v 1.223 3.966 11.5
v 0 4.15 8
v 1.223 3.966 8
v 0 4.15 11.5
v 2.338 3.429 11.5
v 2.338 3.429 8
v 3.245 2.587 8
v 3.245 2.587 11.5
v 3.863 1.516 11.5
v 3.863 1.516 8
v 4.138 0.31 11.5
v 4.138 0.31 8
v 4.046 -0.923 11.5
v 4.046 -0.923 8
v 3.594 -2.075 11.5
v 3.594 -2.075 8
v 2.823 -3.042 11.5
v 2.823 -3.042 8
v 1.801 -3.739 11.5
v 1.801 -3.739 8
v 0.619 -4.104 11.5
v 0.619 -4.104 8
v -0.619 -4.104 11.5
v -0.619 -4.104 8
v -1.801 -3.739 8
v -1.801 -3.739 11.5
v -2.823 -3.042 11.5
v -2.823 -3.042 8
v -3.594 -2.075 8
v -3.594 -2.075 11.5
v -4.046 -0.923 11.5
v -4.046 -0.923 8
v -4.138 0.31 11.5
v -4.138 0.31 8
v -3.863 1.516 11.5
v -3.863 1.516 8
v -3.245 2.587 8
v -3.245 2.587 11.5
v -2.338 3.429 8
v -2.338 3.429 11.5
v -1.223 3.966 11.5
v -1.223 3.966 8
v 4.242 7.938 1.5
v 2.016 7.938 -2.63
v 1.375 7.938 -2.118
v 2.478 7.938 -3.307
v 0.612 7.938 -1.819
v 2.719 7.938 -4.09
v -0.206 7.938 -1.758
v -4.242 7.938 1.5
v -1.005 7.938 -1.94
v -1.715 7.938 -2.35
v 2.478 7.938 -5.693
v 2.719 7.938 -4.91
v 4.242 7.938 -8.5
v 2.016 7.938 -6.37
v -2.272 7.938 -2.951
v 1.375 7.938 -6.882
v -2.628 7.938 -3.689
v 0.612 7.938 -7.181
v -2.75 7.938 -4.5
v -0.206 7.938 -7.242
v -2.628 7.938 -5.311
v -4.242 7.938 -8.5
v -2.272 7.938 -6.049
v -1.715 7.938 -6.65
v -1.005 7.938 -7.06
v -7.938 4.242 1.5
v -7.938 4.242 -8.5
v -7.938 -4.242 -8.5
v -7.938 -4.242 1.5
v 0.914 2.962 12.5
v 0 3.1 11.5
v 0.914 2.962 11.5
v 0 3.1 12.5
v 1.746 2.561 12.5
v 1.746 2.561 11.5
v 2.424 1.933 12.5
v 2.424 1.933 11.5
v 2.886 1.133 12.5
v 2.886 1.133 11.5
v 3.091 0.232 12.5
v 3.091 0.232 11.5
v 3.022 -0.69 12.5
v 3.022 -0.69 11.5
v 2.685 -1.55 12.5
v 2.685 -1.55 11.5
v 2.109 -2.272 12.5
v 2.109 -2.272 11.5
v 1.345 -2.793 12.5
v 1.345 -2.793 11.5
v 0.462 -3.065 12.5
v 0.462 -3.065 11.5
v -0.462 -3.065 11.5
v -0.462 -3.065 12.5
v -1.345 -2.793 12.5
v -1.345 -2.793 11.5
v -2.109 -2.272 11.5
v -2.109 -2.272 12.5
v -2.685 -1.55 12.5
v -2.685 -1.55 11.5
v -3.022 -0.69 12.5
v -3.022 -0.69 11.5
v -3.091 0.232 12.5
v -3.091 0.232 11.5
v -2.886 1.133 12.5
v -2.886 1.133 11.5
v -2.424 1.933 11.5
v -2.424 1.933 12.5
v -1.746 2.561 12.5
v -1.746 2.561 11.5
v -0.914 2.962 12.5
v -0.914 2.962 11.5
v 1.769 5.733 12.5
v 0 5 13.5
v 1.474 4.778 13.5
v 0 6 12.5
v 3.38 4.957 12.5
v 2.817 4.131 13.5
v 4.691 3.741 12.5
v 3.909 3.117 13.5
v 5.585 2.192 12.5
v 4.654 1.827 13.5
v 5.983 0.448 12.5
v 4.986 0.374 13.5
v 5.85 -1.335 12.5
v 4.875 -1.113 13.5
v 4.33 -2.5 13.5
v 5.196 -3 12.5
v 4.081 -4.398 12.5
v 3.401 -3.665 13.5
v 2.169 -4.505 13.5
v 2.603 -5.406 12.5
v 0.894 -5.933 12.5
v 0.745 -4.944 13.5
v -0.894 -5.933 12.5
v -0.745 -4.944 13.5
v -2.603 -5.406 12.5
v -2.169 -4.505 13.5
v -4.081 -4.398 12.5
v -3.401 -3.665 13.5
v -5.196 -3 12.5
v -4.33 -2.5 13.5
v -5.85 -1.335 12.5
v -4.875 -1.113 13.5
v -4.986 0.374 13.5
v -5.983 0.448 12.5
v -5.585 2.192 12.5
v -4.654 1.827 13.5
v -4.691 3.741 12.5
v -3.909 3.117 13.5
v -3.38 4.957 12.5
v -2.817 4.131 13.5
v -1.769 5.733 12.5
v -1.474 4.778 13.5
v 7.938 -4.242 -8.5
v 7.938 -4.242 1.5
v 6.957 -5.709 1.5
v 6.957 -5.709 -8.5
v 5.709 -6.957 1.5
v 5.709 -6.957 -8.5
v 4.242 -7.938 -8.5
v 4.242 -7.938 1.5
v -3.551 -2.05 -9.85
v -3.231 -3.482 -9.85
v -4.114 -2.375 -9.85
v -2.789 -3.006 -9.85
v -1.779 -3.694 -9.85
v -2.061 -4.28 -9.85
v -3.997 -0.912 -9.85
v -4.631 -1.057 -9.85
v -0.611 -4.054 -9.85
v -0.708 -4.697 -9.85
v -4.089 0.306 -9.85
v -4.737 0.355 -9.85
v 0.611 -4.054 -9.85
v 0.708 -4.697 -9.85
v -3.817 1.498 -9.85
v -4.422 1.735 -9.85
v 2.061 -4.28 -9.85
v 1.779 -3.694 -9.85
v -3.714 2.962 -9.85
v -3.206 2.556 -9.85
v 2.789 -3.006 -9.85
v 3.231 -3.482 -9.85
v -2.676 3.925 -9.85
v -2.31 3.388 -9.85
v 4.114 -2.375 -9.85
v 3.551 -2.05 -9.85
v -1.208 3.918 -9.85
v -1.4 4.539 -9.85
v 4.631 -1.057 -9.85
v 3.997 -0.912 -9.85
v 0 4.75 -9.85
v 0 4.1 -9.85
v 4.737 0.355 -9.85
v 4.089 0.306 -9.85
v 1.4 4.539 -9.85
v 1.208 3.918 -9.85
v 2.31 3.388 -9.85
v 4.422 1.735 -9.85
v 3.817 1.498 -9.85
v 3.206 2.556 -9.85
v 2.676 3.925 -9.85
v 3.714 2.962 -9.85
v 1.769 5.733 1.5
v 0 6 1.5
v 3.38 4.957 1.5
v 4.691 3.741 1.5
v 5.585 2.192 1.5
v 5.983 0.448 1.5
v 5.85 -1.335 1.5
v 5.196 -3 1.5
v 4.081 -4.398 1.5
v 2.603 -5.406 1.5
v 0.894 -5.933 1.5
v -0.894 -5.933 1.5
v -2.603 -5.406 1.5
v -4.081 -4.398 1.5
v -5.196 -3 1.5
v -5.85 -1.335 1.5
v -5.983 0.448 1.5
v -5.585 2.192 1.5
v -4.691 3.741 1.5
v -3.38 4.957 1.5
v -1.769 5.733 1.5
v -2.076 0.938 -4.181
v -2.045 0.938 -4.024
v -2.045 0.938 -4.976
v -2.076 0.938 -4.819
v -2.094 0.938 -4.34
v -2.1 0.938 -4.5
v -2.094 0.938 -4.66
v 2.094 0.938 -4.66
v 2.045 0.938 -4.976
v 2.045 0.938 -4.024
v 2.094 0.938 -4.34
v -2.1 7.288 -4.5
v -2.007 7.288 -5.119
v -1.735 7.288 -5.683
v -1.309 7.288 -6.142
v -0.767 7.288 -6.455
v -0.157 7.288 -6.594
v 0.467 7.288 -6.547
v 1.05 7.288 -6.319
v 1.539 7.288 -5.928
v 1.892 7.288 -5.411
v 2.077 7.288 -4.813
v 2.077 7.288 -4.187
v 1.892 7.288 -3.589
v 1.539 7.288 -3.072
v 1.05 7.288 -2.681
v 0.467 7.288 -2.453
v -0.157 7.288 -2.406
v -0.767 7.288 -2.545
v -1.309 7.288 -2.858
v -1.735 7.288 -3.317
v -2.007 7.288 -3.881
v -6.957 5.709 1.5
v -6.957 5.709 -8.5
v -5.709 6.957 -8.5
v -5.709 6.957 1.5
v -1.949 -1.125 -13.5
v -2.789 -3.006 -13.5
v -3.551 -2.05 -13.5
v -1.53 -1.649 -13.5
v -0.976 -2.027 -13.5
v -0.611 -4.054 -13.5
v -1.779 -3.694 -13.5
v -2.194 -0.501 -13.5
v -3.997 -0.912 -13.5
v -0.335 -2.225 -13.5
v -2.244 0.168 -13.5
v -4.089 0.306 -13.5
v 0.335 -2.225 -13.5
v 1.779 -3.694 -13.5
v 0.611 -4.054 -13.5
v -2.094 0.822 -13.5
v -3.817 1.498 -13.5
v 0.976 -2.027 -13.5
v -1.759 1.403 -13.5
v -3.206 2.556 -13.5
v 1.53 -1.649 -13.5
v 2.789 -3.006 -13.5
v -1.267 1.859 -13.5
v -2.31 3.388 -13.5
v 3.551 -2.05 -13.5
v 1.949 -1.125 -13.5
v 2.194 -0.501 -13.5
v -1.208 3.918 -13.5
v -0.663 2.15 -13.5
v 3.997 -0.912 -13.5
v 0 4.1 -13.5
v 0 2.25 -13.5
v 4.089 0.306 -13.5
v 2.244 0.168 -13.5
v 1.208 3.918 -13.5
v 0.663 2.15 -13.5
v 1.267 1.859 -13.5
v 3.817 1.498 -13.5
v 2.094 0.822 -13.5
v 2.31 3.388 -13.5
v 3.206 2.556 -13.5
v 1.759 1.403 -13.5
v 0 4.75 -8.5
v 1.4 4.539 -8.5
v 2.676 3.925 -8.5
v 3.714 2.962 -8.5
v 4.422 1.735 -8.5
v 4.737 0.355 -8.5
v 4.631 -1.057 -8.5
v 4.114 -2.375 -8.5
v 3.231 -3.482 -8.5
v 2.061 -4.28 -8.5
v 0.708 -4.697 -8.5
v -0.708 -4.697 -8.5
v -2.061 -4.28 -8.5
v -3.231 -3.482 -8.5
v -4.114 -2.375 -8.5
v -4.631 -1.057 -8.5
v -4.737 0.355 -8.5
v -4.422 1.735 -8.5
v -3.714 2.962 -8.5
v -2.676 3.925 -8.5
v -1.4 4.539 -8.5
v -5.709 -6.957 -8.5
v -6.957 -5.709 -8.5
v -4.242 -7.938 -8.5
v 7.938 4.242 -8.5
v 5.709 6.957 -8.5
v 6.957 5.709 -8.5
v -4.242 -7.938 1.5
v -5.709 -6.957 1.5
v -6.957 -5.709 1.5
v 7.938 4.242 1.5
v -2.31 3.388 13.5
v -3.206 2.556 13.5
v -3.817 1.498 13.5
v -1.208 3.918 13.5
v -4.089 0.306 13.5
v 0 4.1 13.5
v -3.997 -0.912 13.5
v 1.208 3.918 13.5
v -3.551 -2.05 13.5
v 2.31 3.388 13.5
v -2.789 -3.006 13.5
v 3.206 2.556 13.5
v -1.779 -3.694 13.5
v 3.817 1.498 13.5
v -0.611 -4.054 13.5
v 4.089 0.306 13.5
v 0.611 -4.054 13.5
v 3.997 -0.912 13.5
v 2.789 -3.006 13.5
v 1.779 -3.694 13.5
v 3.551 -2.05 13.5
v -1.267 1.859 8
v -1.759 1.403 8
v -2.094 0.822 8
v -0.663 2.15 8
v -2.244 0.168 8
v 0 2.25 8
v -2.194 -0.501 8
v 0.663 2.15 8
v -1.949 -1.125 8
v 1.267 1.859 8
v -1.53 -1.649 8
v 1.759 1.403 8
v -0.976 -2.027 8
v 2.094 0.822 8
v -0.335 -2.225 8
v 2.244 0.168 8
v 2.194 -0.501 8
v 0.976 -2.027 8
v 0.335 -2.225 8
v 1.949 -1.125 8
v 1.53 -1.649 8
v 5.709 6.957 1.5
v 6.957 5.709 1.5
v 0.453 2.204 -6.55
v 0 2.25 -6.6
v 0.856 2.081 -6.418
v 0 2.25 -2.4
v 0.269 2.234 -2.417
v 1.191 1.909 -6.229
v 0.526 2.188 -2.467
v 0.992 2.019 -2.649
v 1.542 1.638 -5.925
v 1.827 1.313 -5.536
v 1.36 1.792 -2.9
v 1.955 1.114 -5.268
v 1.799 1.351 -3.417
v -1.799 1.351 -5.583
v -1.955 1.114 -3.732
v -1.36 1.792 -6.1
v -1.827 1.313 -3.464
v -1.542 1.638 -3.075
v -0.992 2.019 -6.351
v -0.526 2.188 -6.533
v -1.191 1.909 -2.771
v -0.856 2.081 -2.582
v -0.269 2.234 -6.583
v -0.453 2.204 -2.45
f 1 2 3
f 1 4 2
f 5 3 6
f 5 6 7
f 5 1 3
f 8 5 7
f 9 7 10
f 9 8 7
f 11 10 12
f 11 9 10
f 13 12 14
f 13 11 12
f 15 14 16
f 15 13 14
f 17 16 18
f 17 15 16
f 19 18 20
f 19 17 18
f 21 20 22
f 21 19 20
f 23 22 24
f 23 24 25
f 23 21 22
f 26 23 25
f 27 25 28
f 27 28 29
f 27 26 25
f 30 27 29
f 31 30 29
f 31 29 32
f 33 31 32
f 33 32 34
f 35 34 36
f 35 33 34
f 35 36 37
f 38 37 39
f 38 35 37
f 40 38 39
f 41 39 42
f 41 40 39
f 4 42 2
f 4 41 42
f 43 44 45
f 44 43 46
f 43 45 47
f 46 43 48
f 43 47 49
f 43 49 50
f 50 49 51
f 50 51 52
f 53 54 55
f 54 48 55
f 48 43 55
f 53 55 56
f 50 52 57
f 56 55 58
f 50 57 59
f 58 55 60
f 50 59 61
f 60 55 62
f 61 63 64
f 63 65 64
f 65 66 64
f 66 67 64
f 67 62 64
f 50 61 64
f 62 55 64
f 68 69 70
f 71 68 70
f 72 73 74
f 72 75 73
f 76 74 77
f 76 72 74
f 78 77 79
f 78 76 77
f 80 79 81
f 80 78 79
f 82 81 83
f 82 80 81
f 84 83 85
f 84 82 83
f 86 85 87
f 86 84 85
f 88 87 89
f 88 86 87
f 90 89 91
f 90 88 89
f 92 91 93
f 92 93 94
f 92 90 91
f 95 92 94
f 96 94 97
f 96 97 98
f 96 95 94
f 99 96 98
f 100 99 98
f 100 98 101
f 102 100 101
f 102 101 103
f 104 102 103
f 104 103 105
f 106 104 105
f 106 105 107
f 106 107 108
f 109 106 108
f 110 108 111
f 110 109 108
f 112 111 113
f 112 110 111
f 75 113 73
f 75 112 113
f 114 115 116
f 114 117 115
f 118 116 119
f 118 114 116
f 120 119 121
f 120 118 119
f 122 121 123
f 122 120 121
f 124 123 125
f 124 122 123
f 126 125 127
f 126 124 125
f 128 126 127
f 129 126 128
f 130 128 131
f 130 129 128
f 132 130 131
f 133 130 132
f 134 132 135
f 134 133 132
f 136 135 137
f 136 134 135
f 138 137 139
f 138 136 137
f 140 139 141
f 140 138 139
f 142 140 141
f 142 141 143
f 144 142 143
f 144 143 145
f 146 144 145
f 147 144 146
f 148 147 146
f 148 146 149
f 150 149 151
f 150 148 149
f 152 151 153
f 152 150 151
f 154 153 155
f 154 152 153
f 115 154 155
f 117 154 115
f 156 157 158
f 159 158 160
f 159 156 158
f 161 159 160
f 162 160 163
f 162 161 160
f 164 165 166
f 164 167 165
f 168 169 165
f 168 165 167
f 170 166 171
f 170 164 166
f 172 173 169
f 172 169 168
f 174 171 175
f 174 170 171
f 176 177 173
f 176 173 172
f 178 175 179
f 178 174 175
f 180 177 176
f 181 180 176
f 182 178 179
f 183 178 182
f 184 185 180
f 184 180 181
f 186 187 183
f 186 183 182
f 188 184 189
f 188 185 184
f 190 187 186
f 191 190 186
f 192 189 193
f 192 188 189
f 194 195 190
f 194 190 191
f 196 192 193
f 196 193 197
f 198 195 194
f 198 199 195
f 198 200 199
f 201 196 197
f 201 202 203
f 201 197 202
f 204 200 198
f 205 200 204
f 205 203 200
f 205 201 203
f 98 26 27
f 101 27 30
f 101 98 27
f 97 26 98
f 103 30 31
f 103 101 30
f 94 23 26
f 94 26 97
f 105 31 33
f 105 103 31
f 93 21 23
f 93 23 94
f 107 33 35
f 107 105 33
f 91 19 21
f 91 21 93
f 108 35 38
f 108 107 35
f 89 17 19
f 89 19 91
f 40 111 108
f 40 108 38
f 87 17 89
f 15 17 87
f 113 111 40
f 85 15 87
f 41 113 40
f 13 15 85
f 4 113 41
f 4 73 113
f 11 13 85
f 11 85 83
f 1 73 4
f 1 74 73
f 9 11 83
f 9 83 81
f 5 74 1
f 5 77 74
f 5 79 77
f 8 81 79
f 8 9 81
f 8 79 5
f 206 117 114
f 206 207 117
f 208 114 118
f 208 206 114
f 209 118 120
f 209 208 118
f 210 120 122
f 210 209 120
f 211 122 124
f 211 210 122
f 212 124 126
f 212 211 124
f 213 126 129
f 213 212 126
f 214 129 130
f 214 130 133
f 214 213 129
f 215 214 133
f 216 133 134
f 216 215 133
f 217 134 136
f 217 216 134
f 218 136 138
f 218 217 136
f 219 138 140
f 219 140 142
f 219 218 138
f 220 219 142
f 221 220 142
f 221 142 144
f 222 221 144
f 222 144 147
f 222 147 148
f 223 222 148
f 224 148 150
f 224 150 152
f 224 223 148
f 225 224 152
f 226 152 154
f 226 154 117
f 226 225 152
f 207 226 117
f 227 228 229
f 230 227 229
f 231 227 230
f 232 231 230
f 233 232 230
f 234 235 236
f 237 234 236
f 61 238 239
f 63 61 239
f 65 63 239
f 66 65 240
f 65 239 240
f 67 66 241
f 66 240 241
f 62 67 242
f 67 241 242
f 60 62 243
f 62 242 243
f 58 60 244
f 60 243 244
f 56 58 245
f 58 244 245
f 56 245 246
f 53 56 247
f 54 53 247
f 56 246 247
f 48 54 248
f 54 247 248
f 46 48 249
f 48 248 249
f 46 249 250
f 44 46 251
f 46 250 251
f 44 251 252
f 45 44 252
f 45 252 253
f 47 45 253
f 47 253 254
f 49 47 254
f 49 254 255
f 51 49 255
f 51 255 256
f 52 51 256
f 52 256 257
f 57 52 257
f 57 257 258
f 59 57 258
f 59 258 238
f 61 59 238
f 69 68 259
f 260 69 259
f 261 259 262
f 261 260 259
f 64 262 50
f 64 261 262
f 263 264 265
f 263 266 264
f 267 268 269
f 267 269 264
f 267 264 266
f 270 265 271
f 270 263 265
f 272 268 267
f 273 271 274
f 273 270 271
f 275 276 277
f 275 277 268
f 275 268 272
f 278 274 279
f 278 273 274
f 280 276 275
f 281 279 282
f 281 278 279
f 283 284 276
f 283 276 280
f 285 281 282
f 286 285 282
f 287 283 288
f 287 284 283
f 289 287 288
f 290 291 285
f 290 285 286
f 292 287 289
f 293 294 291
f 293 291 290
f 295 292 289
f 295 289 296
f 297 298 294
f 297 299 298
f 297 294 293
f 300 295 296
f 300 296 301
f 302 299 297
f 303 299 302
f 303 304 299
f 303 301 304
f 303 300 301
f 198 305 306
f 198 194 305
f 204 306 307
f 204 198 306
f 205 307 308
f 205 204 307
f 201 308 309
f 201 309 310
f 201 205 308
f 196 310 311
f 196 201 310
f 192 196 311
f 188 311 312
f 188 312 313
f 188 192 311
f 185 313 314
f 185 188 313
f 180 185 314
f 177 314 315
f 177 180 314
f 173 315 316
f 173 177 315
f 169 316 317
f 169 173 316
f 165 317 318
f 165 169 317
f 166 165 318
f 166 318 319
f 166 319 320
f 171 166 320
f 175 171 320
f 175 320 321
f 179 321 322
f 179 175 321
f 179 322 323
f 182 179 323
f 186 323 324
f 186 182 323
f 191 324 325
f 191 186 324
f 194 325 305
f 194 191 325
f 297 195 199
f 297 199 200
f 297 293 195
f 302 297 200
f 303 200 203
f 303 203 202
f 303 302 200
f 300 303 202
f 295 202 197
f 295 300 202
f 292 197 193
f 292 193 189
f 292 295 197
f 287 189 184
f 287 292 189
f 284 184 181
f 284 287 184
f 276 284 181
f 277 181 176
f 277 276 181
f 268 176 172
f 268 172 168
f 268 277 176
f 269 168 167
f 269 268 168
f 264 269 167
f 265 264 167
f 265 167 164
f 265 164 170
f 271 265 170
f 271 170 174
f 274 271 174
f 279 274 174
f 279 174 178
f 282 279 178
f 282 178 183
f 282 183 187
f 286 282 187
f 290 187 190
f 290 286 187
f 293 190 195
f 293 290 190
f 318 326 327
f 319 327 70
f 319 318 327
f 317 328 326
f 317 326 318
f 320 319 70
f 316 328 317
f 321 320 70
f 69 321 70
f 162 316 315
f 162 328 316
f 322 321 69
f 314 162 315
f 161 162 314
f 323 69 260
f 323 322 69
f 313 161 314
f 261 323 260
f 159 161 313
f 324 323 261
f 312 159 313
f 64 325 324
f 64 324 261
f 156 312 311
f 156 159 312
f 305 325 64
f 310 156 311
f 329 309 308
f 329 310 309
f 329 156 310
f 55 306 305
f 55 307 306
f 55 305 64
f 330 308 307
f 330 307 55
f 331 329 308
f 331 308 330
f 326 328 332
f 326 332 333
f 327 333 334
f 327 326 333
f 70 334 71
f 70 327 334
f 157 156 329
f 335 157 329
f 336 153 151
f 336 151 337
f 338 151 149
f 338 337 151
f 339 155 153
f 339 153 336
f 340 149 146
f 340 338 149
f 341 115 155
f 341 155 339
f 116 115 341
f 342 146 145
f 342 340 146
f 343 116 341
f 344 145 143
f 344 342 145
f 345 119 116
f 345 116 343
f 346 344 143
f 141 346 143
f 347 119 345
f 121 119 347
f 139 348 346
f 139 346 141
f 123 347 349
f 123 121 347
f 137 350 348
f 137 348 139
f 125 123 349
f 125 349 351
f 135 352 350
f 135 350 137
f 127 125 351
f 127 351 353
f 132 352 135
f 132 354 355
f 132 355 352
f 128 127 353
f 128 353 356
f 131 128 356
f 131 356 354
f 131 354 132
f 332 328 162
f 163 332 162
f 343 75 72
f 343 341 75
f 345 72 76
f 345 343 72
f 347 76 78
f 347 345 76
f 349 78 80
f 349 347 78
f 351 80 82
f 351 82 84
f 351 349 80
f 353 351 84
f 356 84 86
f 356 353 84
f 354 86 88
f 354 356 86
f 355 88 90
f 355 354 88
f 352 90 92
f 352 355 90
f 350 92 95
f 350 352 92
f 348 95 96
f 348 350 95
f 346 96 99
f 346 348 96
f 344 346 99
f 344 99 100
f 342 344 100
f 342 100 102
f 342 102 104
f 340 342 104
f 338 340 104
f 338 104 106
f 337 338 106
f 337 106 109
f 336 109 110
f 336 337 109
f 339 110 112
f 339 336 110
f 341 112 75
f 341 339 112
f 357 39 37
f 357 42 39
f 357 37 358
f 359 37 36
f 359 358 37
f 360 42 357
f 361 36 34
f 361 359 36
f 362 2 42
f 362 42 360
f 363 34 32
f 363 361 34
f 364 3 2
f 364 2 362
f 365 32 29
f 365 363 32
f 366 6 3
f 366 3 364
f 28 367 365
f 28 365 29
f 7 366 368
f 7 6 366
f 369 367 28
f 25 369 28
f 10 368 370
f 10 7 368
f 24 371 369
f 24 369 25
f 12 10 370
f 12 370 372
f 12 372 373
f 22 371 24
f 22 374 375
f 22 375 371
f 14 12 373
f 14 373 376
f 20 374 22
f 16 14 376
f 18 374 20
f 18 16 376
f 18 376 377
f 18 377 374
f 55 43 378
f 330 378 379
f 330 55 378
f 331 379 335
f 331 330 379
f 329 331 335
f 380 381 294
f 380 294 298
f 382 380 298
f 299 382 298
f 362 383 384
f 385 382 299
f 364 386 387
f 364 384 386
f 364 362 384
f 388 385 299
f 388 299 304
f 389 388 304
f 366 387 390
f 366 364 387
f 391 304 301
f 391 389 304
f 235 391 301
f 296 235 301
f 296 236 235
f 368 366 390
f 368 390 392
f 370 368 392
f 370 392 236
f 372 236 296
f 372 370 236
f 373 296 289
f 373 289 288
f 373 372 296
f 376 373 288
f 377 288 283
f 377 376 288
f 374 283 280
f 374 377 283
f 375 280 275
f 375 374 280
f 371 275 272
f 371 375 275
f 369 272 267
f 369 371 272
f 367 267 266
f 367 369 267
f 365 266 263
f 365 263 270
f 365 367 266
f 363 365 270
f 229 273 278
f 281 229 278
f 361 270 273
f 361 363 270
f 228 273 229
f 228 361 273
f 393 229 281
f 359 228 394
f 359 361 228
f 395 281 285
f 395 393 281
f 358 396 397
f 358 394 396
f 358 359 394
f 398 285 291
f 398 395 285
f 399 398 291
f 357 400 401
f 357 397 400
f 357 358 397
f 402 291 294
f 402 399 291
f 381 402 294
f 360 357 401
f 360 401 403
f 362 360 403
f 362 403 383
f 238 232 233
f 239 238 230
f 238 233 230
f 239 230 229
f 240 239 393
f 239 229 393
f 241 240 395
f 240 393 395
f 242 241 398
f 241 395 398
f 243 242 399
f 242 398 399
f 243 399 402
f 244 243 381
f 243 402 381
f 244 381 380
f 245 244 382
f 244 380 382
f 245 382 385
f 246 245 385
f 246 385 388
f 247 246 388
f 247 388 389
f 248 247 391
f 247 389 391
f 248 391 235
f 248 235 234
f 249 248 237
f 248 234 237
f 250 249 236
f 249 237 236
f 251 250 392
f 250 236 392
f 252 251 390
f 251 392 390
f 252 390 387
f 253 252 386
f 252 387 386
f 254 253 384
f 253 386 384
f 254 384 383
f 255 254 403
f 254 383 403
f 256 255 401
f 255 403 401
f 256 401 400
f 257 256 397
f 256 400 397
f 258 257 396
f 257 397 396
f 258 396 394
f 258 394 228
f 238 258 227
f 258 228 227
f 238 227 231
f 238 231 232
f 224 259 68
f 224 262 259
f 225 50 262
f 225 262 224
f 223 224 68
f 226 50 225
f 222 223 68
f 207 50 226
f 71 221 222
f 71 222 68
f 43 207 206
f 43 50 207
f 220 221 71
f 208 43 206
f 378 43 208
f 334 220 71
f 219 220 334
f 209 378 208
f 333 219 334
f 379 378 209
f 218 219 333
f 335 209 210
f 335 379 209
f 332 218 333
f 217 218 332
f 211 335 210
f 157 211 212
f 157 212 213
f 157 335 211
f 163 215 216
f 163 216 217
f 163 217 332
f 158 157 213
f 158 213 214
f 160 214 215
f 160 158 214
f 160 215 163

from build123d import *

# Parameters (mm, degrees)
CUT_EXTRUDE2_REACH              = 24
M5X0_8_TAPPED_HOLE1_D           = 4.2
M5X0_8_TAPPED_HOLE1_DEPTH       = 7
M5X0_8_TAPPED_HOLE1_CSINK_D     = 5.5
M5X0_8_TAPPED_HOLE1_CSINK_ANGLE = 90


with BuildPart() as part:
    # Sketch1 → Revolve1 (revolve)
    with BuildSketch(Plane(origin=(0, 0, 0), x_dir=(0, 0, -1), z_dir=(1, 0, 0))):
        Polygon((-12.5, 3.1), (-13.5, 4.1), (-13.5, 5), (-12.5, 6), (-1.5, 6), (-1.5, 9), (8.5, 9), (8.5, 4.75), (9.85, 4.75), (9.85, 4.1), (13.5, 4.1), (13.5, 2.25), (-8, 2.25), (-8, 4.15), (-11.5, 4.15), (-11.5, 3.1), align=None)
    revolve(axis=Axis((0, 0, 0), (0, 0, -1)))

    # Sketch2 → Cut-Extrude2 (cut, up to next)
    with BuildSketch(Plane(origin=(0, 0, -8.5), x_dir=(-1, 0, 0), z_dir=(0, 0, -1)), mode=Mode.PRIVATE) as cut_extrude2_sk1:
        with BuildLine():
            ThreePointArc((4.242180306, 7.9375), (0, 9), (-4.242180306, 7.9375))
            Line((-4.242180306, 7.9375), (4.242180306, 7.9375))
        make_face()
    cut_extrude2_tool1 = extrude(cut_extrude2_sk1.sketch, amount=-CUT_EXTRUDE2_REACH, mode=Mode.PRIVATE) & part.part
    add(cut_extrude2_tool1.solids().sort_by_distance((0, 8.364726, -8.5))[0], mode=Mode.SUBTRACT)
    # Sketch2 → Cut-Extrude2 (cut, up to next)
    with BuildSketch(Plane(origin=(0, 0, -8.5), x_dir=(-1, 0, 0), z_dir=(0, 0, -1)), mode=Mode.PRIVATE) as cut_extrude2_sk2:
        with BuildLine():
            Line((-7.9375, -4.242180306), (-7.9375, 4.242180306))
            ThreePointArc((-7.9375, 4.242180306), (-9, 0), (-7.9375, -4.242180306))
        make_face()
    cut_extrude2_tool2 = extrude(cut_extrude2_sk2.sketch, amount=-CUT_EXTRUDE2_REACH, mode=Mode.PRIVATE) & part.part
    add(cut_extrude2_tool2.solids().sort_by_distance((8.364726, 0, -8.5))[0], mode=Mode.SUBTRACT)
    # Sketch2 → Cut-Extrude2 (cut, up to next)
    with BuildSketch(Plane(origin=(0, 0, -8.5), x_dir=(-1, 0, 0), z_dir=(0, 0, -1)), mode=Mode.PRIVATE) as cut_extrude2_sk3:
        with BuildLine():
            Line((4.242180306, -7.9375), (-4.242180306, -7.9375))
            ThreePointArc((-4.242180306, -7.9375), (0, -9), (4.242180306, -7.9375))
        make_face()
    cut_extrude2_tool3 = extrude(cut_extrude2_sk3.sketch, amount=-CUT_EXTRUDE2_REACH, mode=Mode.PRIVATE) & part.part
    add(cut_extrude2_tool3.solids().sort_by_distance((0, -8.364726, -8.5))[0], mode=Mode.SUBTRACT)
    # Sketch2 → Cut-Extrude2 (cut, up to next)
    with BuildSketch(Plane(origin=(0, 0, -8.5), x_dir=(-1, 0, 0), z_dir=(0, 0, -1)), mode=Mode.PRIVATE) as cut_extrude2_sk4:
        with BuildLine():
            ThreePointArc((9, 0), (8.730335045, 2.186606961), (7.9375, 4.242180306))
            Line((7.9375, 4.242180306), (7.9375, -4.242180306))
            ThreePointArc((7.9375, -4.242180306), (8.730335045, -2.186606961), (9, 0))
        make_face()
    cut_extrude2_tool4 = extrude(cut_extrude2_sk4.sketch, amount=-CUT_EXTRUDE2_REACH, mode=Mode.PRIVATE) & part.part
    add(cut_extrude2_tool4.solids().sort_by_distance((-8.364726, 0, -8.5))[0], mode=Mode.SUBTRACT)

    # M5x0.8 Tapped Hole1
    with Locations(Plane(origin=(0, 7.9375, 0), x_dir=(1, 0, 0), z_dir=(0, 1, 0))):
        with Locations((0, 4.5)):
            CounterSinkHole(M5X0_8_TAPPED_HOLE1_D / 2, M5X0_8_TAPPED_HOLE1_CSINK_D / 2, depth=M5X0_8_TAPPED_HOLE1_DEPTH, counter_sink_angle=M5X0_8_TAPPED_HOLE1_CSINK_ANGLE)


solid = part.part
